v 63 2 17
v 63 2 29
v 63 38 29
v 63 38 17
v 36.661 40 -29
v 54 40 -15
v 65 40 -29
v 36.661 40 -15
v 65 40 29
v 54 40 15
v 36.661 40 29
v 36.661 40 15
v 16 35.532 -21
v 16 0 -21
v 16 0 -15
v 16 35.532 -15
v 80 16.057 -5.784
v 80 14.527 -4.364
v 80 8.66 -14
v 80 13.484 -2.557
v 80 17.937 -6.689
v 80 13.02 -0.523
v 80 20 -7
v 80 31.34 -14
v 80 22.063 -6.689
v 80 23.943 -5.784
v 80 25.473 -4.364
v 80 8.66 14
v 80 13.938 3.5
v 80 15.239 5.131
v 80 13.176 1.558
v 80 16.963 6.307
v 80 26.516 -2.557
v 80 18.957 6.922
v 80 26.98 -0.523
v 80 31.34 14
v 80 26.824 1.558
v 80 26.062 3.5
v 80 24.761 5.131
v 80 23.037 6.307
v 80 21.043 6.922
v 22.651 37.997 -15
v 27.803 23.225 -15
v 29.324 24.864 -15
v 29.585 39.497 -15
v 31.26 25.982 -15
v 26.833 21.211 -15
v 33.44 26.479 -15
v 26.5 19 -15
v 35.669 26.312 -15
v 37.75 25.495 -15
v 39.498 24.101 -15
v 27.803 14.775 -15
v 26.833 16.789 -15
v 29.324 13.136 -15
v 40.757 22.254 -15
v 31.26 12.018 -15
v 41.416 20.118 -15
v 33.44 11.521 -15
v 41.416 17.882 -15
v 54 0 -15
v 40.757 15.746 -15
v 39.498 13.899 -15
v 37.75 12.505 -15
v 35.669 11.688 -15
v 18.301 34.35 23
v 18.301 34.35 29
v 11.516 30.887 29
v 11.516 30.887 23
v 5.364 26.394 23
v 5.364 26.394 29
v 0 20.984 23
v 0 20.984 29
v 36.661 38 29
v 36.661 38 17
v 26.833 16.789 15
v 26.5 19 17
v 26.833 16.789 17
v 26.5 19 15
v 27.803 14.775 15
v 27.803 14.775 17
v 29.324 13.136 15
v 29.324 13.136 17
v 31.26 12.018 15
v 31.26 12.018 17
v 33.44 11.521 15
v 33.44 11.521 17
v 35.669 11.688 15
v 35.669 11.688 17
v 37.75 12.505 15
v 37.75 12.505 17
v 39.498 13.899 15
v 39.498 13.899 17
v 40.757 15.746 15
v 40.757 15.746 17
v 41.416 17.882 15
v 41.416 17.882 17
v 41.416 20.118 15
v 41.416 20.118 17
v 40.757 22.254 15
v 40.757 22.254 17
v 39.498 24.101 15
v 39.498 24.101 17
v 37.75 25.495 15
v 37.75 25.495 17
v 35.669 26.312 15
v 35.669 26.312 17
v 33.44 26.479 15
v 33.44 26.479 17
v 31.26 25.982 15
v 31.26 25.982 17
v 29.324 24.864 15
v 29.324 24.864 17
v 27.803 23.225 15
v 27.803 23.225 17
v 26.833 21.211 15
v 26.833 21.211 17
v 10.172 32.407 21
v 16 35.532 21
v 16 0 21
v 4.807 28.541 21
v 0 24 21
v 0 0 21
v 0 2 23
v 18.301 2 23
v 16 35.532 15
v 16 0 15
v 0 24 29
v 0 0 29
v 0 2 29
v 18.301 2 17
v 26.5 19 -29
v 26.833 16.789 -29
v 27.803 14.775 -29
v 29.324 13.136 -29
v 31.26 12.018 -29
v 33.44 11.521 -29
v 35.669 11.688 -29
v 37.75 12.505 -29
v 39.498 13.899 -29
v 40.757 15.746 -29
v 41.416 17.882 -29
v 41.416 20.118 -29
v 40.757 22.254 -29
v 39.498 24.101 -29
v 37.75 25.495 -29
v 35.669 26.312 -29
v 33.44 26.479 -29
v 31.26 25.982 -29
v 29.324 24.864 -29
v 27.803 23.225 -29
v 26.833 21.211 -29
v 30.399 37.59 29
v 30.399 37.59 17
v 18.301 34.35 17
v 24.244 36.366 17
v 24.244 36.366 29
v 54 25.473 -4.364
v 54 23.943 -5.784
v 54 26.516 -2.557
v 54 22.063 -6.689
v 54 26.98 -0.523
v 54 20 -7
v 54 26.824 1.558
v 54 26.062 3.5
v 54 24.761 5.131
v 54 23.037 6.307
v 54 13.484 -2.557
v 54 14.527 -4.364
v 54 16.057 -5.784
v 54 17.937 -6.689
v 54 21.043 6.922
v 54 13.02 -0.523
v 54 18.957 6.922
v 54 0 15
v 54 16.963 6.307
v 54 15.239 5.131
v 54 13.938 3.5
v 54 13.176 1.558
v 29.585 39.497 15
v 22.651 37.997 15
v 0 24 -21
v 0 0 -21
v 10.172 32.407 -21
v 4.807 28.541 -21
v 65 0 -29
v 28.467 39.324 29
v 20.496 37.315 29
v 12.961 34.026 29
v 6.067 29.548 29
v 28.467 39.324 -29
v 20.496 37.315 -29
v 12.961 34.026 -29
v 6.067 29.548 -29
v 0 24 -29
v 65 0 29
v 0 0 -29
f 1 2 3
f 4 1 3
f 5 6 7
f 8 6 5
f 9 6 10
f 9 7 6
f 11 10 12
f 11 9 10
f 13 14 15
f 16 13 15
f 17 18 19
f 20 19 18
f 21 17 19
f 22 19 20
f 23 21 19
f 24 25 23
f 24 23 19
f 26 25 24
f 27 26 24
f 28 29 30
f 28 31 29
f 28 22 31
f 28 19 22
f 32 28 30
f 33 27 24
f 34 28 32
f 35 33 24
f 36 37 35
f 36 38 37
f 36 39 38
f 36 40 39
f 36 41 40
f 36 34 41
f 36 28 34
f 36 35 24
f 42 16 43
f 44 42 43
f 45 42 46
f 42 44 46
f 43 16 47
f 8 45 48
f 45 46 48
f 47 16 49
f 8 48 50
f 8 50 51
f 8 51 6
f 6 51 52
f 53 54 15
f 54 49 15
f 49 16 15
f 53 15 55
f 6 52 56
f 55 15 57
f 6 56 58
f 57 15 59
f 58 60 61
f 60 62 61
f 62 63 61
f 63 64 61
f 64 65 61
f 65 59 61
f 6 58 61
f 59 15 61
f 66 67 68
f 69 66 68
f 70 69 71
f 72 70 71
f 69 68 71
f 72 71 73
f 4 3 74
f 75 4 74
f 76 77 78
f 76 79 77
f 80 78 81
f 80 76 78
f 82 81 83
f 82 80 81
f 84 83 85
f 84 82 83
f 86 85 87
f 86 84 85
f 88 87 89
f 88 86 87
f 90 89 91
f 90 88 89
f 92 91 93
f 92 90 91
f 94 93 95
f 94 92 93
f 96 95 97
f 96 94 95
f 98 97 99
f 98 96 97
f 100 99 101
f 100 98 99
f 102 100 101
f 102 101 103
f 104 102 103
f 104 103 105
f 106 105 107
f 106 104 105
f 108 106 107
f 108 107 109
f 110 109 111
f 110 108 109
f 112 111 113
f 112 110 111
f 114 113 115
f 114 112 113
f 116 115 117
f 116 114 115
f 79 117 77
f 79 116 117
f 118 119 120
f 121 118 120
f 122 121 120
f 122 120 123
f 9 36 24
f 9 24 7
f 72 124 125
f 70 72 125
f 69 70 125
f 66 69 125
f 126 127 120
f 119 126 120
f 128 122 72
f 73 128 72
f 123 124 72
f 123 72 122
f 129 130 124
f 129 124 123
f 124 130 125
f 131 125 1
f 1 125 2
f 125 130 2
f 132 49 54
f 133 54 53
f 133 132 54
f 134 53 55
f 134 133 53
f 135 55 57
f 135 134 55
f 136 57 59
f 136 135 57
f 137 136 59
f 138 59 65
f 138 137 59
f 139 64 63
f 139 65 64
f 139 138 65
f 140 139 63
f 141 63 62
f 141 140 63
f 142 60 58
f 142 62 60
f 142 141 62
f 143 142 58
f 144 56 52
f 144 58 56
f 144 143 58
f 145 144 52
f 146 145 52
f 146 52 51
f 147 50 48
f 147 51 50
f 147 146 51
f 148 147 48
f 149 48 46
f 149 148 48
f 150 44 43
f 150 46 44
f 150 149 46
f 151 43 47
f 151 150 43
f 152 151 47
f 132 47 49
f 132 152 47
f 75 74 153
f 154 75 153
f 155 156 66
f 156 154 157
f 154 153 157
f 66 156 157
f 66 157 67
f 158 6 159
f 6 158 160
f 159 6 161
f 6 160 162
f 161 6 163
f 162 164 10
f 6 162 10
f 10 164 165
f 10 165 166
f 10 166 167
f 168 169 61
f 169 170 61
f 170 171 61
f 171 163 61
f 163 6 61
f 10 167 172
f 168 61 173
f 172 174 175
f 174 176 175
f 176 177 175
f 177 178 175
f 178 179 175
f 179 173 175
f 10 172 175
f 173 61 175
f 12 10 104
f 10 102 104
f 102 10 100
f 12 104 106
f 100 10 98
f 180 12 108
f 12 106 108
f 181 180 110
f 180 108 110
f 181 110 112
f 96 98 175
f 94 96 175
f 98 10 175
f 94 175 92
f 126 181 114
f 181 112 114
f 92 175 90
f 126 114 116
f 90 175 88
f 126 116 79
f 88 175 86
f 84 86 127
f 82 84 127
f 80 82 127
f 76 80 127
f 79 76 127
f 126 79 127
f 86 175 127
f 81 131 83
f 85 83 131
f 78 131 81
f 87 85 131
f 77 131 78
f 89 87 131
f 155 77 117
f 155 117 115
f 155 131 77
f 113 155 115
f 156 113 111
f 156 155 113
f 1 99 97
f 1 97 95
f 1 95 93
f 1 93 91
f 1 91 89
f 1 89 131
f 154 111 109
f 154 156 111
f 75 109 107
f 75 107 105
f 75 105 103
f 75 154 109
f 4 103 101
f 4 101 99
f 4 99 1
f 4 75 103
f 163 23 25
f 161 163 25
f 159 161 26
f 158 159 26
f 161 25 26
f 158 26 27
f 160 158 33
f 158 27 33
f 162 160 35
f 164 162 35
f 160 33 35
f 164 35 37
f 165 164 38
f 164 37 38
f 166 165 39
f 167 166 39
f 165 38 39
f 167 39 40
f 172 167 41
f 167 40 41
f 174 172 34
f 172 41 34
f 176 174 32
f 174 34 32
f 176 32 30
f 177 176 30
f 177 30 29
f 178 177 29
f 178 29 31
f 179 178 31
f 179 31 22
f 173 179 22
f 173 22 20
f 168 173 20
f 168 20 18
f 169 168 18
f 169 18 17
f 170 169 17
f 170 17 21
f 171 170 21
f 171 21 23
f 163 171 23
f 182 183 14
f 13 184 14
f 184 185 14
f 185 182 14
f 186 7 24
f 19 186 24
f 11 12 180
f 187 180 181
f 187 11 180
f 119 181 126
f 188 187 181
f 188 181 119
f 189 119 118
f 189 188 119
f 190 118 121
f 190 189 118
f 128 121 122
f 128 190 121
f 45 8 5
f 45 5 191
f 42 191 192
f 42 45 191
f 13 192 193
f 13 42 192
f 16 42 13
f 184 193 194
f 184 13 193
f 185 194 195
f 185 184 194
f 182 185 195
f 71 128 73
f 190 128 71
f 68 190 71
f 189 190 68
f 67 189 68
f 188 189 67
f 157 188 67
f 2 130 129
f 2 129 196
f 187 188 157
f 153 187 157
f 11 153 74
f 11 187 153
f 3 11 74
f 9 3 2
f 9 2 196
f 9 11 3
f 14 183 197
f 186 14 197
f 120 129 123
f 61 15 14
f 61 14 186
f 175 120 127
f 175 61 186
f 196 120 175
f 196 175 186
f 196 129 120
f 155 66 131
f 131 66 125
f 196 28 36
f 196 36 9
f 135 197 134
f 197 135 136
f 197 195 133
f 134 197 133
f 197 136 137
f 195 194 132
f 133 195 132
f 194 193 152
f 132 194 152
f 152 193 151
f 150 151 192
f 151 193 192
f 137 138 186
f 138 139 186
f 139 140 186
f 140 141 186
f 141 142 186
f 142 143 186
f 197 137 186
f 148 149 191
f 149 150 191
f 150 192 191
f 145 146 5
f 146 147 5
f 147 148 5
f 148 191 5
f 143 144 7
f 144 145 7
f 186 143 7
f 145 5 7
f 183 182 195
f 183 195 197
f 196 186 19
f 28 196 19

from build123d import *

# Parameters (mm, degrees)
SKETCH1_R           = 7.5
BOSS_EXTRUDE1_DEPTH = 29
CUT_EXTRUDE1_DEPTH  = 72
CUT_EXTRUDE2_DEPTH  = 72
SKETCH4_R           = 7
CUT_EXTRUDE3_DEPTH  = 72
CUT_EXTRUDE11_DEPTH = 12
CUT_EXTRUDE12_DEPTH = 6


with BuildPart() as part:
    # Sketch1 → Boss-Extrude1 (new, symmetric)
    with BuildSketch(Plane.XY):
        with BuildLine():
            Line((0, 0), (65, 0))
            Line((65, 0), (80, 8.660254038))
            Line((80, 8.660254038), (80, 31.339745962))
            Line((80, 31.339745962), (65, 40))
            Line((65, 40), (36.66060556, 40))
            ThreePointArc((36.66060556, 40), (16.66060556, 35.82575695), (0, 24))
            Line((0, 24), (0, 0))
        make_face()
        with Locations(Location((34, 19, 0), (0, 0, 180))):
            Circle(SKETCH1_R, mode=Mode.SUBTRACT)
    extrude(amount=BOSS_EXTRUDE1_DEPTH, both=True)

    # Sketch2 → Cut-Extrude1 (cut)
    with BuildSketch(Plane(origin=(0, 0, 0), x_dir=(1, 0, 0), z_dir=(0, 1, 0))):
        Polygon((0, 21), (16, 21), (16, 15), (54, 15), (54, -15), (16, -15), (16, -21), (0, -21), align=None)
    extrude(amount=CUT_EXTRUDE1_DEPTH, mode=Mode.SUBTRACT)

    # Sketch3 → Cut-Extrude2 (cut)
    with BuildSketch(Plane(origin=(0, 0, 0), x_dir=(1, 0, 0), z_dir=(0, 1, 0))):
        Polygon((80, 29), (65, 29), (80, 14), align=None)
        Polygon((65, -29), (80, -29), (80, -14), align=None)
    extrude(amount=CUT_EXTRUDE2_DEPTH, mode=Mode.SUBTRACT)

    # Sketch4 → Cut-Extrude3 (cut)
    with BuildSketch(Plane(origin=(80, 0, 0), x_dir=(0, 0, -1), z_dir=(1, 0, 0))):
        with Locations((0, 20)):
            Circle(SKETCH4_R)
    extrude(amount=-CUT_EXTRUDE3_DEPTH, mode=Mode.SUBTRACT)

    # Sketch6 → Cut-Extrude11 (cut)
    with BuildSketch(Plane.XY.offset(29)):
        with BuildLine():
            Line((63, 2), (63, 38))
            Line((63, 38), (36.66060556, 38))
            ThreePointArc((36.66060556, 38), (27.30122037, 37.078677858), (18.301127214, 34.350079536))
            Line((18.301127214, 34.350079536), (18.301127214, 2))
            Line((18.301127214, 2), (63, 2))
        make_face()
    extrude(amount=-CUT_EXTRUDE11_DEPTH, mode=Mode.SUBTRACT)

    # Sketch8 → Cut-Extrude12 (cut)
    with BuildSketch(Plane.XY.offset(29)):
        with BuildLine():
            Line((0, 2), (18.301127214, 2))
            Line((18.301127214, 2), (18.301127214, 34.350079536))
            ThreePointArc((18.301127214, 34.350079536), (8.350425073, 28.76252934), (0, 20.98386677))
            Line((0, 20.98386677), (0, 2))
        make_face()
    extrude(amount=-CUT_EXTRUDE12_DEPTH, mode=Mode.SUBTRACT)


solid = part.part
